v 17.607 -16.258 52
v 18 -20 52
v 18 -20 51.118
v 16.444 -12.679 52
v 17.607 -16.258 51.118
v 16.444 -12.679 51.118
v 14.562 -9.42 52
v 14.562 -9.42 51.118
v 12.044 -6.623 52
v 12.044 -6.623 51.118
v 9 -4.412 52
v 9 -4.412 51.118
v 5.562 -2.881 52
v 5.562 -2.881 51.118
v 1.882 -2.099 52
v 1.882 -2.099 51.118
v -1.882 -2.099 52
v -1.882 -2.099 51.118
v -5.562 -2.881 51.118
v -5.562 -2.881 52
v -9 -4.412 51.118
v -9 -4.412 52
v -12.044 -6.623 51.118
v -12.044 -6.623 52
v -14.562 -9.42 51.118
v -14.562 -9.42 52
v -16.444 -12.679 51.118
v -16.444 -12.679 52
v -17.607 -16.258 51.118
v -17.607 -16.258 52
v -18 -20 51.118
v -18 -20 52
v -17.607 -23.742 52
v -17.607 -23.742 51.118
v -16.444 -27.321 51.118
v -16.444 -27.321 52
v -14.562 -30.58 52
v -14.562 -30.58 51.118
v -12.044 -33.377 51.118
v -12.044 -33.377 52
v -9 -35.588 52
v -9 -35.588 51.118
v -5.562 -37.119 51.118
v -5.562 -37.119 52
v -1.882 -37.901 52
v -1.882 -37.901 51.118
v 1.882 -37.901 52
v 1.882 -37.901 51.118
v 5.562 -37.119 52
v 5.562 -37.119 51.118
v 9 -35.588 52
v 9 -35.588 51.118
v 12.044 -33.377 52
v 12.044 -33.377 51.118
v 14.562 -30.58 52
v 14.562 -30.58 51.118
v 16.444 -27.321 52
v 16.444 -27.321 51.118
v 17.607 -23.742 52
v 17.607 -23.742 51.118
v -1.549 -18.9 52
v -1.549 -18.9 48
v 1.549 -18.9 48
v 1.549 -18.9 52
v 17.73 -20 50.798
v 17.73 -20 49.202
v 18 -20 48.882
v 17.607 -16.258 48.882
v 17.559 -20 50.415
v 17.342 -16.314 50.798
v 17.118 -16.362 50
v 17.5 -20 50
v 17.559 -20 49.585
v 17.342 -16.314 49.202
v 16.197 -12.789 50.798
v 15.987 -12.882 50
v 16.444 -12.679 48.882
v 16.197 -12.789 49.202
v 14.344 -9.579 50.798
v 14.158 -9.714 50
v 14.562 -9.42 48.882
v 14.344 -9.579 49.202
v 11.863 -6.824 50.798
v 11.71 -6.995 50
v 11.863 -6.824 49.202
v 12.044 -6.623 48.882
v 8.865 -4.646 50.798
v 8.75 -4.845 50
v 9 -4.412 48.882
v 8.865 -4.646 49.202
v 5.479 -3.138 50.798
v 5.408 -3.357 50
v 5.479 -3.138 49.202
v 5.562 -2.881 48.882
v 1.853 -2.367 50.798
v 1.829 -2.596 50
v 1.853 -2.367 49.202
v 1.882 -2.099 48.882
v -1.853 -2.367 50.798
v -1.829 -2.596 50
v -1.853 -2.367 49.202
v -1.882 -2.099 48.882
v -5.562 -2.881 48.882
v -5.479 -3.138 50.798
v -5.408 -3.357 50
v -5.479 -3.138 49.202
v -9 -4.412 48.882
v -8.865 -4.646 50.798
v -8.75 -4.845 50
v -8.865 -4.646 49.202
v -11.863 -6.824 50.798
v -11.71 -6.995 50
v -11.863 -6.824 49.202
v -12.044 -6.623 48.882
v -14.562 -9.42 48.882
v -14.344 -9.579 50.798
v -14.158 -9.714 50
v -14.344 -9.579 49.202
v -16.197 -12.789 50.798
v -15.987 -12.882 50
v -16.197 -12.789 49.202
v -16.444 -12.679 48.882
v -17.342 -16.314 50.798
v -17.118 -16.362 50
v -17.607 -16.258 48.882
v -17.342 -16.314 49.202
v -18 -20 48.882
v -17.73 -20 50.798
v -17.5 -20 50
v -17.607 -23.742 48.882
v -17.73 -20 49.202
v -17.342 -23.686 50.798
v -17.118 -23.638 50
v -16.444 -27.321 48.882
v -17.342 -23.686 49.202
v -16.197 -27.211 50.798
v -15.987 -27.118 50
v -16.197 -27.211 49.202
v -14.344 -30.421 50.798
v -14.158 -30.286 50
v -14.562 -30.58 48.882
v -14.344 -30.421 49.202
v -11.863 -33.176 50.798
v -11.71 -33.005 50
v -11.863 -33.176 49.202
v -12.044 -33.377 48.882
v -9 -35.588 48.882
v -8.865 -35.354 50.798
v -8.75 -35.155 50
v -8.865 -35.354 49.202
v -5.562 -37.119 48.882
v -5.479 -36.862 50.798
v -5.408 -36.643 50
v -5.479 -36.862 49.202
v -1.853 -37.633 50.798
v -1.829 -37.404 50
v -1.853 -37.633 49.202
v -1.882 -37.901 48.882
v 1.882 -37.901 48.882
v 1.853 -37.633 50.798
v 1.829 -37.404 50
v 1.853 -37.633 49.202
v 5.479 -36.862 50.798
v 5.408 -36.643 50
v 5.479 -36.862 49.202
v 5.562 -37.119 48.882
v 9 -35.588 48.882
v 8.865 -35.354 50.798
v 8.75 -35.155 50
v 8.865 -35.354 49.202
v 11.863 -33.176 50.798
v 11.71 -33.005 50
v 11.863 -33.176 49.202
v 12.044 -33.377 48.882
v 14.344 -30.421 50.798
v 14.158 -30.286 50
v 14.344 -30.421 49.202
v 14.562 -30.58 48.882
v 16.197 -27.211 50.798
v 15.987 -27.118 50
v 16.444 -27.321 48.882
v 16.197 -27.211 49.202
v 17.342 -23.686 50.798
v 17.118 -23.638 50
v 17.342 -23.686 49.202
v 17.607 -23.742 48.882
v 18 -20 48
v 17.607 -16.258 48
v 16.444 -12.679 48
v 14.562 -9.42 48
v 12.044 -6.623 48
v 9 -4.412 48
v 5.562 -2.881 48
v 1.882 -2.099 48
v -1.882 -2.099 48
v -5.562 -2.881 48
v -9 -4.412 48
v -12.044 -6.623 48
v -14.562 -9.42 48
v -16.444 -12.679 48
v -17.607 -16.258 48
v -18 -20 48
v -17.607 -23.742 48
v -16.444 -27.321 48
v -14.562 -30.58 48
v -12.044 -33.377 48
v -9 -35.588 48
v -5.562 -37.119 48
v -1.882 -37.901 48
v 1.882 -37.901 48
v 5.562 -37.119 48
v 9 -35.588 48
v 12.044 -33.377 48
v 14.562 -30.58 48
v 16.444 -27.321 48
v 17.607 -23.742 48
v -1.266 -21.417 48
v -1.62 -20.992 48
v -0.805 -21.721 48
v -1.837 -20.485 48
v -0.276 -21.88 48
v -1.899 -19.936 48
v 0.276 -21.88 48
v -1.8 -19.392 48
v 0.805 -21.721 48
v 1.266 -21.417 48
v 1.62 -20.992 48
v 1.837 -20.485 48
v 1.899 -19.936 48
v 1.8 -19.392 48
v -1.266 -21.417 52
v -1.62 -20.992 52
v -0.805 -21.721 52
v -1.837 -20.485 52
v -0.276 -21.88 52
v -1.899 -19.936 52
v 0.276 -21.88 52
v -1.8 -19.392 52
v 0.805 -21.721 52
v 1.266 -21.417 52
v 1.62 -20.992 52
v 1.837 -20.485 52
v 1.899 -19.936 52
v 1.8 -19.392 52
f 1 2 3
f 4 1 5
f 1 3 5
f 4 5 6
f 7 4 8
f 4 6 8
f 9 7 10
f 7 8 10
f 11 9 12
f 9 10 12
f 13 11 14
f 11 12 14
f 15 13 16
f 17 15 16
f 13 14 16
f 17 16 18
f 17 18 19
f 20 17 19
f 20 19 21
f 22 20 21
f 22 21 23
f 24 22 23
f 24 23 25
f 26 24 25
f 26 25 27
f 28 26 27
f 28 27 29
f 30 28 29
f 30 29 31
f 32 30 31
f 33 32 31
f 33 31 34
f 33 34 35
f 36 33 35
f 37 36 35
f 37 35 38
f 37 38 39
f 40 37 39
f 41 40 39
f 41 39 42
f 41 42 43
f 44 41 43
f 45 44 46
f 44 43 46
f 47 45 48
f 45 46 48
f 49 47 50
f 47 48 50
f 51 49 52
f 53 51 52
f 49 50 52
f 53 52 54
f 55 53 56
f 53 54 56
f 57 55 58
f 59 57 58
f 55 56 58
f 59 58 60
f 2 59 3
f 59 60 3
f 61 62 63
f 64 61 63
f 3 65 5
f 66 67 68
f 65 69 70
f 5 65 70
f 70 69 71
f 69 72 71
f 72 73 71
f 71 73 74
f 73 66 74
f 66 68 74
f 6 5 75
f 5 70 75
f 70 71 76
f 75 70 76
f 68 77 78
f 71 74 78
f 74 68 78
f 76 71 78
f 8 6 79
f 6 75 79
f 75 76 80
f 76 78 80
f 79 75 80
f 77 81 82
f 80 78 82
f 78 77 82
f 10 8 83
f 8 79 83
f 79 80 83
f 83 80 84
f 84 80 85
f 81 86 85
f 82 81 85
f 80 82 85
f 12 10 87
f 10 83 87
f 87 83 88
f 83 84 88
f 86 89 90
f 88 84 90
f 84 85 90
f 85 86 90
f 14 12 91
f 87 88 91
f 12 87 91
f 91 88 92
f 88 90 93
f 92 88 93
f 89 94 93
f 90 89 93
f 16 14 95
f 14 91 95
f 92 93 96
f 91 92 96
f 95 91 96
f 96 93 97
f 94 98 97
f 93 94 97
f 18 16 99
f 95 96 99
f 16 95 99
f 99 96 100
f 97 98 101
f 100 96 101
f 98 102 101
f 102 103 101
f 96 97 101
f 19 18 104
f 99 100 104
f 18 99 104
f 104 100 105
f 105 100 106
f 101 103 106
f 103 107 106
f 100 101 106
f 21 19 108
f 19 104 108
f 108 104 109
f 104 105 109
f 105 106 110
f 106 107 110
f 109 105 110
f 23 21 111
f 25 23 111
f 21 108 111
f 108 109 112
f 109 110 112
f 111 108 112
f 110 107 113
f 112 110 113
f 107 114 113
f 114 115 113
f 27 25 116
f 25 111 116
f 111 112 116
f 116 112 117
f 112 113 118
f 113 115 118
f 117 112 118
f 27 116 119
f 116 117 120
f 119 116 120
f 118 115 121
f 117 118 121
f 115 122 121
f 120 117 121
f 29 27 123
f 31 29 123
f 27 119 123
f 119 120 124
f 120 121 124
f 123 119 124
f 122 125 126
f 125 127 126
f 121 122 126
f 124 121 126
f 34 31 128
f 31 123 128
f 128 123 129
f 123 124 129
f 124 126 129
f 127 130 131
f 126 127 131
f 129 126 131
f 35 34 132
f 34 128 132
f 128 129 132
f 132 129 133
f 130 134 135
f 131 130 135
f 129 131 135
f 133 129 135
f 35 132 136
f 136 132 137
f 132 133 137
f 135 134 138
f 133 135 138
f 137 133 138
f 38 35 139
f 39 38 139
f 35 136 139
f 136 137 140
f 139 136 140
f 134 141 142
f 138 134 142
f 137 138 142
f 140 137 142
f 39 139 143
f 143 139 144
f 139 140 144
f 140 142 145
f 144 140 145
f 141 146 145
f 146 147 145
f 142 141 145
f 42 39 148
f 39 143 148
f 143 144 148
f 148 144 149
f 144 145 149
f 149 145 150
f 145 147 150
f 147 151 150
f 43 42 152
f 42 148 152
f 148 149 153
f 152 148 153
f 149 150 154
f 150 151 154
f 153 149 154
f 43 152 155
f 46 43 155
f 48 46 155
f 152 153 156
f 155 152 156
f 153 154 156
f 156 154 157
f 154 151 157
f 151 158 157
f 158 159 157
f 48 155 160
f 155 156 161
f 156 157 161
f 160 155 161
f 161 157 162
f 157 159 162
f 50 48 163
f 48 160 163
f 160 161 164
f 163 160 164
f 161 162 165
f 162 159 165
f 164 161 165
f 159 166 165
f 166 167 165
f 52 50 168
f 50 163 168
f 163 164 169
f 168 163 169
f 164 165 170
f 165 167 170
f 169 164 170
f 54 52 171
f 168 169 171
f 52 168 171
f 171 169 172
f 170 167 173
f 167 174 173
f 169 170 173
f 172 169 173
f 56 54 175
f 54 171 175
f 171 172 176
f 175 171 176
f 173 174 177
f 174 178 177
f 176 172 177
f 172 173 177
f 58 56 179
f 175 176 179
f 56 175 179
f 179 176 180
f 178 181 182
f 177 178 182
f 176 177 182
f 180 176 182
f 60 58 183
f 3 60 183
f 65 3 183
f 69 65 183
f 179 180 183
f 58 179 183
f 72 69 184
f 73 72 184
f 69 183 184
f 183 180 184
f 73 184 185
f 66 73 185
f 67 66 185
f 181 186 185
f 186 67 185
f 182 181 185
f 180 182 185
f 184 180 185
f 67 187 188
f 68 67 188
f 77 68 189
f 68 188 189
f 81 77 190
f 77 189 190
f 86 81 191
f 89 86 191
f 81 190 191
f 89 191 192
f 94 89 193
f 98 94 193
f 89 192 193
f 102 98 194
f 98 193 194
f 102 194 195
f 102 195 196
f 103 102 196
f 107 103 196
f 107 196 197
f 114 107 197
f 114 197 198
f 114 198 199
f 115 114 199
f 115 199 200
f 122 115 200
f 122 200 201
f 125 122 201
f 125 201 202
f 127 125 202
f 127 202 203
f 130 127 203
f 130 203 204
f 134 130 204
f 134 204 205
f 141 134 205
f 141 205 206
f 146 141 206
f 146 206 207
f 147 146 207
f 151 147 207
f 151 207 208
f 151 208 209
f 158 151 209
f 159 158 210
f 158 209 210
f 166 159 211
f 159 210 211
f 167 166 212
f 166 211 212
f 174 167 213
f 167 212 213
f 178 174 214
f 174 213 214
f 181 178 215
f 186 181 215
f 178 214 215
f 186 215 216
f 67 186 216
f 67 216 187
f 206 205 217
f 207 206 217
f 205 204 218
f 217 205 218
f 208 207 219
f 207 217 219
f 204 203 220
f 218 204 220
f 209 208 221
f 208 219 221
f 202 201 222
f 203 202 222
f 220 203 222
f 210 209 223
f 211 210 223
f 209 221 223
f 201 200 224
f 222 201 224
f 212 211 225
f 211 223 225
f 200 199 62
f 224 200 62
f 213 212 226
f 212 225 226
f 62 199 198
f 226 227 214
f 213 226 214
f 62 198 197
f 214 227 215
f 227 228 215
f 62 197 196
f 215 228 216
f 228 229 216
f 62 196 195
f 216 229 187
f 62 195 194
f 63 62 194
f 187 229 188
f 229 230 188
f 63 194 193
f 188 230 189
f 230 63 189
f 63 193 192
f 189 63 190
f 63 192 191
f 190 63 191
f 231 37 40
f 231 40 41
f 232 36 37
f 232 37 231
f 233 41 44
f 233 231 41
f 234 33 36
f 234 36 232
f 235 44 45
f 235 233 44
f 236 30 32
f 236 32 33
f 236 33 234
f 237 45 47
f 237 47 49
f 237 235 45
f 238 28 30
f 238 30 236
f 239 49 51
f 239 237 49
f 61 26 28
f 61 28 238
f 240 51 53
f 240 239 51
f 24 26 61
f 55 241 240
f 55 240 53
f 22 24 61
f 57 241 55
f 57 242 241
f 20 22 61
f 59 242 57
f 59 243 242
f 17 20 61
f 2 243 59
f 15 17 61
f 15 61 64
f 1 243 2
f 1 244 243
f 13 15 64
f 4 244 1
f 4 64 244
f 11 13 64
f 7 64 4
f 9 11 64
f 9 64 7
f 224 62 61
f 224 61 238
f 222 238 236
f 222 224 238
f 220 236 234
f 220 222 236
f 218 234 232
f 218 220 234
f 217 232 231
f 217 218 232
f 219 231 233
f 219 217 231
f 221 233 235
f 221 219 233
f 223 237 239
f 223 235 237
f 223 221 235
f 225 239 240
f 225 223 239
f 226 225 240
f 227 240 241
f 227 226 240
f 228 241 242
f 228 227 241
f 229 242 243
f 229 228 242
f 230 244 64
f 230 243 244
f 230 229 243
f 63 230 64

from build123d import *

# Parameters (mm, degrees)
TORUS002_R        = 1.5
BOX084016_W       = 10
BOX084016_H       = 10
BOX084016_DEPTH   = 12
CYLINDER028_R     = 1.9
CYLINDER028_DEPTH = 10
CYLINDER012_R     = 18
CYLINDER012_DEPTH = 4


with BuildPart() as torus002:
    # Torus002 → Torus002 (revolve)
    with BuildSketch(Plane(origin=(0, 0, 2), x_dir=(1, 0, 0), z_dir=(0, -1, 0))):
        with Locations((19, 0)):
            Circle(TORUS002_R)
    revolve(axis=Axis((0, 0, 2), (0, 0, 1)))


with BuildPart() as cube067:
    # Box084016 → Box084016 (new body)
    with BuildSketch(Plane(origin=(-5, 1.1, -1.5), x_dir=(1, 0, 0), z_dir=(0, 0, 1))):
        with Locations((5, 5)):
            Rectangle(BOX084016_W, BOX084016_H)
    extrude(amount=BOX084016_DEPTH)


with BuildPart() as cut057:
    # Cylinder028 → Cylinder028 (new body)
    with BuildSketch(Plane.XY.offset(-1)):
        Circle(CYLINDER028_R)
    extrude(amount=CYLINDER028_DEPTH)

    # Cut057: cut Cube067
    add(cube067.part, mode=Mode.SUBTRACT)


with BuildPart() as wheel:
    # Cylinder012 → Cylinder012 (new body)
    with BuildSketch(Plane.XY):
        Circle(CYLINDER012_R)
    extrude(amount=CYLINDER012_DEPTH)

    # Cut062: cut Cut057
    add(cut057.part, mode=Mode.SUBTRACT)

    # Cut063: cut Torus002
    add(torus002.part, mode=Mode.SUBTRACT)


with BuildPart() as wheel_1:
    # Cut063 placement: moved
    add(wheel.part.moved(Location((0, -20, 48))))


solid = wheel_1.part
